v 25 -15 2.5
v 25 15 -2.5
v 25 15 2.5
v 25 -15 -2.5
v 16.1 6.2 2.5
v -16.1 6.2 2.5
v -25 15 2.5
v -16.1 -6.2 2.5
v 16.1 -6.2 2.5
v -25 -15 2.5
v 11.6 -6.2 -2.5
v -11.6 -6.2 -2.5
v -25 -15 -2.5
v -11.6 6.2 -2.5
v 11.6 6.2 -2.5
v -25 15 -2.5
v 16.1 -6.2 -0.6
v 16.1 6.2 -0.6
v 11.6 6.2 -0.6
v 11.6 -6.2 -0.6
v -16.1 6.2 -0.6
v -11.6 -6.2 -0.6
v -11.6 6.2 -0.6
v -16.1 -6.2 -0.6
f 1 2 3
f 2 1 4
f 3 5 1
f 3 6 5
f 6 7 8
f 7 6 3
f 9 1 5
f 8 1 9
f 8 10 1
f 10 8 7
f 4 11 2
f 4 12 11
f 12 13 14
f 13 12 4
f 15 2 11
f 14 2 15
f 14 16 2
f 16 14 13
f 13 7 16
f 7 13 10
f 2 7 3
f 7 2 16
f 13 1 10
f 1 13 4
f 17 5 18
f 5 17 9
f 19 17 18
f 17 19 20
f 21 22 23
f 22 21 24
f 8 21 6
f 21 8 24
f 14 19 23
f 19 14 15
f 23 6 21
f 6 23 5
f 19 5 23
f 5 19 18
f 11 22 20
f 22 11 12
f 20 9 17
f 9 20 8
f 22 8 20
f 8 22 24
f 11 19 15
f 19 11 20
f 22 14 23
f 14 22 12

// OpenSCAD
// Module to create a mounting plate for a 9g servo (like SG90)
// This version uses global variables for configuration.

// --- 🔧 Global Parameters for Servo Mount ---
// Change these values to customize your plate.

tol = 0.2;                 // Printing tolerance

// Plate dimensions
plate_dims = [50, 30];
plate_thickness = 5;

// --- Standard 9g (SG90) Servo Dimensions ---
servo_body = [23, 12.2];   // [width, depth]
servo_flange = [32, 12.2]; // [width, depth]
flange_thickness = 3;
screw_spacing = 28;
screw_dia = 3;           // Good for an M2 screw
use_screws = false;

// --- Example Usage ---
// Call the module to create the plate.
// It will use the global variables defined above.
servo_mount_plate();


/**
 * Creates a rectangular plate with a 9g servo cutout.
 * This module reads its configuration from the global
 * variables defined at the top of the file.
 */
module servo_mount_plate() {
    
    // Use difference() to subtract the holes from the main plate
    difference() {
        
        // 1. The main plate
        cube([plate_dims[0], plate_dims[1], plate_thickness], center = true);
        
        // --- Subtractions ---
        
        // 2. The flush indentation (pocket) for the flange
        // We move this cutting cube so its top is aligned with the plate's top
        translate([0, 0, (plate_thickness / 2) - (flange_thickness / 2)]) {
            cube([
                servo_flange[0] + tol, 
                servo_flange[1] + tol, 
                flange_thickness + tol // Cut slightly deeper to ensure flush
            ], center = true);
        }
        
        // 3. The main hole for the servo body
        // This cube is extra tall to ensure it cuts all the way through
        cube([
            servo_body[0] + tol, 
            servo_body[1] + tol, 
            plate_thickness + 2 // +2 ensures a clean cut
        ], center = true);
        
        if (use_screws) {
            // 4. The screw holes
            // We use a for loop to create both holes
            for (x_pos = [-screw_spacing / 2, screw_spacing / 2]) {
                translate([x_pos, 0, 0]) {
                    cylinder(
                        h = plate_thickness + 2, // +2 ensures a clean cut
                        d = screw_dia, 
                        center = true
                    );
                }
            }
        }
    }
}

$fn=100; // Increase segments for a smoother render
